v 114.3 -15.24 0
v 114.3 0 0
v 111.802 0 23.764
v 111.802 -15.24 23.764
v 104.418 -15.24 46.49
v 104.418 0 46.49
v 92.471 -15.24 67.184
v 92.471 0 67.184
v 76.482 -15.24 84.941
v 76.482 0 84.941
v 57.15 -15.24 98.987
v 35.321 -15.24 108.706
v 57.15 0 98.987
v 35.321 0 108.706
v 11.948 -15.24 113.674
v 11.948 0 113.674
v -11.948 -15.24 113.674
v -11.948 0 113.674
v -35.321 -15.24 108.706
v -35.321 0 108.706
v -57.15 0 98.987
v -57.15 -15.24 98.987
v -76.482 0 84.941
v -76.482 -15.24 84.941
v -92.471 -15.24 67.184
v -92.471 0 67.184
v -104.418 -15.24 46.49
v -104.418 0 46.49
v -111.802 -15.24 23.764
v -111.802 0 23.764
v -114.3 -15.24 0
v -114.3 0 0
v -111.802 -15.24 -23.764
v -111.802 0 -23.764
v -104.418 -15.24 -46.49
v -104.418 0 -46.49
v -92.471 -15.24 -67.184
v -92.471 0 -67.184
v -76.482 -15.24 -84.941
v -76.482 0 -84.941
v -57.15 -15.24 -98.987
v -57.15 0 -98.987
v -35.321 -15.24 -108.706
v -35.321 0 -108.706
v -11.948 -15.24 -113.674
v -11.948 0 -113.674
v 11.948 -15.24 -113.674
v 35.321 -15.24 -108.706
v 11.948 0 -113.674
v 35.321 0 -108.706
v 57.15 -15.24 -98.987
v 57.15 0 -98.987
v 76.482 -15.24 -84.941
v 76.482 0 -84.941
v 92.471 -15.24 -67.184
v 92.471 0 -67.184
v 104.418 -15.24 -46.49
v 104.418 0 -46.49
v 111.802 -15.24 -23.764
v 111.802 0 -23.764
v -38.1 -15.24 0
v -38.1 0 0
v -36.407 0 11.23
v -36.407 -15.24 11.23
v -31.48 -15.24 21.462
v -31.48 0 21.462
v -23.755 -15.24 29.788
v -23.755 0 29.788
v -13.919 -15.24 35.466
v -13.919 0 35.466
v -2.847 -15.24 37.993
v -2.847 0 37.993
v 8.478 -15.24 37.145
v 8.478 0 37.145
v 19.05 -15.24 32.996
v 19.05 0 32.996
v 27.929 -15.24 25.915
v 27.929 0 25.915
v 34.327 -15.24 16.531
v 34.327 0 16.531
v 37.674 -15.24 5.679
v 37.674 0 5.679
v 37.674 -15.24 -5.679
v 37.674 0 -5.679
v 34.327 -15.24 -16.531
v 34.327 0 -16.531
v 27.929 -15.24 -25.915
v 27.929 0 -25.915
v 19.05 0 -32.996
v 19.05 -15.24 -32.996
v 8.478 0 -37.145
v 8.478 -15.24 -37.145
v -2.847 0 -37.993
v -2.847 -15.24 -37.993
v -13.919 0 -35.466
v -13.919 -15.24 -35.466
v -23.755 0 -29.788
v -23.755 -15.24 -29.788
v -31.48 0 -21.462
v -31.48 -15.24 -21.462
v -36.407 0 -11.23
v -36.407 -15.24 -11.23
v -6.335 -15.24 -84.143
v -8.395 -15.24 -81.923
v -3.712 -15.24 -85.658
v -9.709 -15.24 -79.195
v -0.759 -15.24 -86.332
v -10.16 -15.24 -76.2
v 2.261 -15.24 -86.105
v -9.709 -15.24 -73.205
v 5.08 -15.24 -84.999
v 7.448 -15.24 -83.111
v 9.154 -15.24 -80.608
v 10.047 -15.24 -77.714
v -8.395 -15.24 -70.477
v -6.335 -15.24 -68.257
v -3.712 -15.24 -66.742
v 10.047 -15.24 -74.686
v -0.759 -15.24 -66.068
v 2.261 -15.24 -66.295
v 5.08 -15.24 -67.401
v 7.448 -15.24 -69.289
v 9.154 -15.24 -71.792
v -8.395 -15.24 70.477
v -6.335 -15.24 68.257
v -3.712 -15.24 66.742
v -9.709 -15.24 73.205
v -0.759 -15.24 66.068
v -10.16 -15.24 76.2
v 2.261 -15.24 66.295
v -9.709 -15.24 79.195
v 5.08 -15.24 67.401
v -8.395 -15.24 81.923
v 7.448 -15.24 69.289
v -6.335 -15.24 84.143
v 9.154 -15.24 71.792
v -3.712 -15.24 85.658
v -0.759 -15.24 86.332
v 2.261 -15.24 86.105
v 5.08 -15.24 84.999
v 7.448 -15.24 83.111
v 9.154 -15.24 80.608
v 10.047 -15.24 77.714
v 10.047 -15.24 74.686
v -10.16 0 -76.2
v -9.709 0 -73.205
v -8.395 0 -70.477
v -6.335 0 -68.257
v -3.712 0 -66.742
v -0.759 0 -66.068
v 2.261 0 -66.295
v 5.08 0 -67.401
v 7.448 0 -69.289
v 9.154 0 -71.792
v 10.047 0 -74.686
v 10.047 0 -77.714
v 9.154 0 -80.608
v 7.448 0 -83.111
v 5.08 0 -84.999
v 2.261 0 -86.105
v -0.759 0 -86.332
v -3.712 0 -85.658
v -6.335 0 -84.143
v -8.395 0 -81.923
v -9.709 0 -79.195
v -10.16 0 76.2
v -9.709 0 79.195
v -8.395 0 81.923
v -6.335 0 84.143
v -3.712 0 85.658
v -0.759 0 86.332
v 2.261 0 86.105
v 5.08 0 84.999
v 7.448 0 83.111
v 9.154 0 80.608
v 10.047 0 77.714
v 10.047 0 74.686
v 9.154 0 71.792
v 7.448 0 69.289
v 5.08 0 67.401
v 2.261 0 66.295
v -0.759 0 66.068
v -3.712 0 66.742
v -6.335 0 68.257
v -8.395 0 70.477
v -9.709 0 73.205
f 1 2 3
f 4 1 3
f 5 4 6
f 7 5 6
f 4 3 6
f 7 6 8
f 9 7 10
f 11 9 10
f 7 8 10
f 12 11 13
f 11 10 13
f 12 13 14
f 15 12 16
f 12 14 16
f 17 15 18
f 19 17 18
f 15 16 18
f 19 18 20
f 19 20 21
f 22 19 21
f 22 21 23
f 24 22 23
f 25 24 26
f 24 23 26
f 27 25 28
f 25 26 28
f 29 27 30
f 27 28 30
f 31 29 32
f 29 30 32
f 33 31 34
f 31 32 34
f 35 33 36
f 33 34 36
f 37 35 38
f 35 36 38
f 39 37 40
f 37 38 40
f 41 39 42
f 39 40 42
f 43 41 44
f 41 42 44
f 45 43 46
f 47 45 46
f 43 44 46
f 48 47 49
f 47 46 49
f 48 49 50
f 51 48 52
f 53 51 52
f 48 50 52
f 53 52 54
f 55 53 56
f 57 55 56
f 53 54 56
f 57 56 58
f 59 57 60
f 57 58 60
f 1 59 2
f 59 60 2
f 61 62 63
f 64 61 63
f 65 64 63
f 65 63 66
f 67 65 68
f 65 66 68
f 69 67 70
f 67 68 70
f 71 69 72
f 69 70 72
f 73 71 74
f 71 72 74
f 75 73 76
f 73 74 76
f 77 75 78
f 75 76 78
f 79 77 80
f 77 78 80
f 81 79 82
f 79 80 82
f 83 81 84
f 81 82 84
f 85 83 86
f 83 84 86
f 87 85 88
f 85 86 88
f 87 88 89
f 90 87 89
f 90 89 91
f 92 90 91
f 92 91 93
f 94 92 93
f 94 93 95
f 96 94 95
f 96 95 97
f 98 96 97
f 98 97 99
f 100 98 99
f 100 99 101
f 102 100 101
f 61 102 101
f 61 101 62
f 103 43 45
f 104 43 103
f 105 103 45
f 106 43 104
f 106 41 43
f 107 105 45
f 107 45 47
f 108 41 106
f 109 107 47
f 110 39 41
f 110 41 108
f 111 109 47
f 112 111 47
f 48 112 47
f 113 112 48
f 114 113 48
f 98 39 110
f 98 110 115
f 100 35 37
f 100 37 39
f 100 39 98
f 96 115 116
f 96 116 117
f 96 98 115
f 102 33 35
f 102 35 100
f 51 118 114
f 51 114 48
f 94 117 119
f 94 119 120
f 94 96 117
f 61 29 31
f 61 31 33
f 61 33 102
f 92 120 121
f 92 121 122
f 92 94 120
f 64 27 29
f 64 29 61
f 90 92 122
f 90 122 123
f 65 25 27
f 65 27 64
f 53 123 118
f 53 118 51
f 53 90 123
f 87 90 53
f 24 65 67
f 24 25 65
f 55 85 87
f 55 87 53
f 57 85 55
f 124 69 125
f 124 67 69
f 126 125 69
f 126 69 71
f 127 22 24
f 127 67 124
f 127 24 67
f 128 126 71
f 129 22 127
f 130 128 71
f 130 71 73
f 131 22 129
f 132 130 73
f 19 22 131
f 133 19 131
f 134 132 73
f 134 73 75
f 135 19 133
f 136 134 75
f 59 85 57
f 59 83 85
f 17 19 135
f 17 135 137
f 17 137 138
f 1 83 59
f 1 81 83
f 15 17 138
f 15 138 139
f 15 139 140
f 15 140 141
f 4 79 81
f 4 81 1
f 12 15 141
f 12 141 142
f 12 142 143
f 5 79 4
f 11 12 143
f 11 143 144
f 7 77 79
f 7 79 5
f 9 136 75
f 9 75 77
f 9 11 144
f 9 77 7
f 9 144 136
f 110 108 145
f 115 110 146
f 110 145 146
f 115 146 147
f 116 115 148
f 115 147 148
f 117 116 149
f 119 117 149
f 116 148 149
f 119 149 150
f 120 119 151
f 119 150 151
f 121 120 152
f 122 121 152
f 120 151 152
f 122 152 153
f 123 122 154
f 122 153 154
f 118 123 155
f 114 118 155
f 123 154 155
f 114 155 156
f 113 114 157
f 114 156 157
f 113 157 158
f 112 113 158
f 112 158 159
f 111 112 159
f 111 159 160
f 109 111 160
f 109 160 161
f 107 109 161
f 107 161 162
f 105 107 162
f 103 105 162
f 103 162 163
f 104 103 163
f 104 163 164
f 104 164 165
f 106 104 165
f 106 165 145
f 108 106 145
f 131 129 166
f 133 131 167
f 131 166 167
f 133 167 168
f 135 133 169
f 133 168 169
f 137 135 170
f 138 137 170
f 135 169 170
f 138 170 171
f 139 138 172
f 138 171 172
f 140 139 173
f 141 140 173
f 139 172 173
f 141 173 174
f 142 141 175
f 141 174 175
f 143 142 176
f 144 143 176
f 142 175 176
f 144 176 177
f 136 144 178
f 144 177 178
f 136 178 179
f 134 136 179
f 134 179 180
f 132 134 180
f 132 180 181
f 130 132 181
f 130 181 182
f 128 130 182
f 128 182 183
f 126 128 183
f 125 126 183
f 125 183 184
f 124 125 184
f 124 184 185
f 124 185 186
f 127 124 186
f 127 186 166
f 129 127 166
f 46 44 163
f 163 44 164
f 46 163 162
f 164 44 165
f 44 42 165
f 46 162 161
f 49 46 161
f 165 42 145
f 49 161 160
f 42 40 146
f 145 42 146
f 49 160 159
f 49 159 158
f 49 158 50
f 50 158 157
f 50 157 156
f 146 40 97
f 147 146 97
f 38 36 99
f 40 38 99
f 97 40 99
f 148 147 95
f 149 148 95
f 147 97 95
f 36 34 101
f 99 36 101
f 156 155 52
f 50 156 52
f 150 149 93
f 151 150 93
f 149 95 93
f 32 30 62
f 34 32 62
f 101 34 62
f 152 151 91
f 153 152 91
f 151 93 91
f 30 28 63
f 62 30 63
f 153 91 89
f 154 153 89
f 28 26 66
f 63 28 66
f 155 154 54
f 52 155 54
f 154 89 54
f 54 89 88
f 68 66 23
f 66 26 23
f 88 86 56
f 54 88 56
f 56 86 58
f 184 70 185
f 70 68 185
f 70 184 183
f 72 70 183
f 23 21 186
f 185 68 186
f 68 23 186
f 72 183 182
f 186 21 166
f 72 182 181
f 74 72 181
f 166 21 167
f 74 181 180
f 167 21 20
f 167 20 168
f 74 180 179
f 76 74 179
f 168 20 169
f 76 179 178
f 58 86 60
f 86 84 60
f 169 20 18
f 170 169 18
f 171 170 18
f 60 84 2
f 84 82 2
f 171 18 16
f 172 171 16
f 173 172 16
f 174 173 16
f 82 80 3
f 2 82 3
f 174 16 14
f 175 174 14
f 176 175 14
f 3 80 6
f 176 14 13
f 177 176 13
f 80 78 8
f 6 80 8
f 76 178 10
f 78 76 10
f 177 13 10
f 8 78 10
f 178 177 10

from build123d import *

# Parameters (mm, degrees)
F0_R     = 114.3
F1_DEPTH = 15.24
F3_D     = 76.2
F5_D     = 20.32
F7_D     = 20.32


with BuildPart() as f1:
    # F0 (on Front) → F1 (new body)
    with BuildSketch(Plane.XZ):
        Circle(F0_R)
    extrude(amount=F1_DEPTH)

    # F3 (through all)
    with Locations(Plane.XZ.offset(15.24)):
        with Locations((0, 0)):
            Hole(F3_D / 2)

    # F5 (through all)
    with Locations(Plane.XZ.offset(15.24)):
        with Locations((0, 76.2)):
            Hole(F5_D / 2)

    # F7 (through all)
    with Locations(Plane.XZ.offset(15.24)):
        with Locations((0, -76.2)):
            Hole(F7_D / 2)


solid = f1.part
